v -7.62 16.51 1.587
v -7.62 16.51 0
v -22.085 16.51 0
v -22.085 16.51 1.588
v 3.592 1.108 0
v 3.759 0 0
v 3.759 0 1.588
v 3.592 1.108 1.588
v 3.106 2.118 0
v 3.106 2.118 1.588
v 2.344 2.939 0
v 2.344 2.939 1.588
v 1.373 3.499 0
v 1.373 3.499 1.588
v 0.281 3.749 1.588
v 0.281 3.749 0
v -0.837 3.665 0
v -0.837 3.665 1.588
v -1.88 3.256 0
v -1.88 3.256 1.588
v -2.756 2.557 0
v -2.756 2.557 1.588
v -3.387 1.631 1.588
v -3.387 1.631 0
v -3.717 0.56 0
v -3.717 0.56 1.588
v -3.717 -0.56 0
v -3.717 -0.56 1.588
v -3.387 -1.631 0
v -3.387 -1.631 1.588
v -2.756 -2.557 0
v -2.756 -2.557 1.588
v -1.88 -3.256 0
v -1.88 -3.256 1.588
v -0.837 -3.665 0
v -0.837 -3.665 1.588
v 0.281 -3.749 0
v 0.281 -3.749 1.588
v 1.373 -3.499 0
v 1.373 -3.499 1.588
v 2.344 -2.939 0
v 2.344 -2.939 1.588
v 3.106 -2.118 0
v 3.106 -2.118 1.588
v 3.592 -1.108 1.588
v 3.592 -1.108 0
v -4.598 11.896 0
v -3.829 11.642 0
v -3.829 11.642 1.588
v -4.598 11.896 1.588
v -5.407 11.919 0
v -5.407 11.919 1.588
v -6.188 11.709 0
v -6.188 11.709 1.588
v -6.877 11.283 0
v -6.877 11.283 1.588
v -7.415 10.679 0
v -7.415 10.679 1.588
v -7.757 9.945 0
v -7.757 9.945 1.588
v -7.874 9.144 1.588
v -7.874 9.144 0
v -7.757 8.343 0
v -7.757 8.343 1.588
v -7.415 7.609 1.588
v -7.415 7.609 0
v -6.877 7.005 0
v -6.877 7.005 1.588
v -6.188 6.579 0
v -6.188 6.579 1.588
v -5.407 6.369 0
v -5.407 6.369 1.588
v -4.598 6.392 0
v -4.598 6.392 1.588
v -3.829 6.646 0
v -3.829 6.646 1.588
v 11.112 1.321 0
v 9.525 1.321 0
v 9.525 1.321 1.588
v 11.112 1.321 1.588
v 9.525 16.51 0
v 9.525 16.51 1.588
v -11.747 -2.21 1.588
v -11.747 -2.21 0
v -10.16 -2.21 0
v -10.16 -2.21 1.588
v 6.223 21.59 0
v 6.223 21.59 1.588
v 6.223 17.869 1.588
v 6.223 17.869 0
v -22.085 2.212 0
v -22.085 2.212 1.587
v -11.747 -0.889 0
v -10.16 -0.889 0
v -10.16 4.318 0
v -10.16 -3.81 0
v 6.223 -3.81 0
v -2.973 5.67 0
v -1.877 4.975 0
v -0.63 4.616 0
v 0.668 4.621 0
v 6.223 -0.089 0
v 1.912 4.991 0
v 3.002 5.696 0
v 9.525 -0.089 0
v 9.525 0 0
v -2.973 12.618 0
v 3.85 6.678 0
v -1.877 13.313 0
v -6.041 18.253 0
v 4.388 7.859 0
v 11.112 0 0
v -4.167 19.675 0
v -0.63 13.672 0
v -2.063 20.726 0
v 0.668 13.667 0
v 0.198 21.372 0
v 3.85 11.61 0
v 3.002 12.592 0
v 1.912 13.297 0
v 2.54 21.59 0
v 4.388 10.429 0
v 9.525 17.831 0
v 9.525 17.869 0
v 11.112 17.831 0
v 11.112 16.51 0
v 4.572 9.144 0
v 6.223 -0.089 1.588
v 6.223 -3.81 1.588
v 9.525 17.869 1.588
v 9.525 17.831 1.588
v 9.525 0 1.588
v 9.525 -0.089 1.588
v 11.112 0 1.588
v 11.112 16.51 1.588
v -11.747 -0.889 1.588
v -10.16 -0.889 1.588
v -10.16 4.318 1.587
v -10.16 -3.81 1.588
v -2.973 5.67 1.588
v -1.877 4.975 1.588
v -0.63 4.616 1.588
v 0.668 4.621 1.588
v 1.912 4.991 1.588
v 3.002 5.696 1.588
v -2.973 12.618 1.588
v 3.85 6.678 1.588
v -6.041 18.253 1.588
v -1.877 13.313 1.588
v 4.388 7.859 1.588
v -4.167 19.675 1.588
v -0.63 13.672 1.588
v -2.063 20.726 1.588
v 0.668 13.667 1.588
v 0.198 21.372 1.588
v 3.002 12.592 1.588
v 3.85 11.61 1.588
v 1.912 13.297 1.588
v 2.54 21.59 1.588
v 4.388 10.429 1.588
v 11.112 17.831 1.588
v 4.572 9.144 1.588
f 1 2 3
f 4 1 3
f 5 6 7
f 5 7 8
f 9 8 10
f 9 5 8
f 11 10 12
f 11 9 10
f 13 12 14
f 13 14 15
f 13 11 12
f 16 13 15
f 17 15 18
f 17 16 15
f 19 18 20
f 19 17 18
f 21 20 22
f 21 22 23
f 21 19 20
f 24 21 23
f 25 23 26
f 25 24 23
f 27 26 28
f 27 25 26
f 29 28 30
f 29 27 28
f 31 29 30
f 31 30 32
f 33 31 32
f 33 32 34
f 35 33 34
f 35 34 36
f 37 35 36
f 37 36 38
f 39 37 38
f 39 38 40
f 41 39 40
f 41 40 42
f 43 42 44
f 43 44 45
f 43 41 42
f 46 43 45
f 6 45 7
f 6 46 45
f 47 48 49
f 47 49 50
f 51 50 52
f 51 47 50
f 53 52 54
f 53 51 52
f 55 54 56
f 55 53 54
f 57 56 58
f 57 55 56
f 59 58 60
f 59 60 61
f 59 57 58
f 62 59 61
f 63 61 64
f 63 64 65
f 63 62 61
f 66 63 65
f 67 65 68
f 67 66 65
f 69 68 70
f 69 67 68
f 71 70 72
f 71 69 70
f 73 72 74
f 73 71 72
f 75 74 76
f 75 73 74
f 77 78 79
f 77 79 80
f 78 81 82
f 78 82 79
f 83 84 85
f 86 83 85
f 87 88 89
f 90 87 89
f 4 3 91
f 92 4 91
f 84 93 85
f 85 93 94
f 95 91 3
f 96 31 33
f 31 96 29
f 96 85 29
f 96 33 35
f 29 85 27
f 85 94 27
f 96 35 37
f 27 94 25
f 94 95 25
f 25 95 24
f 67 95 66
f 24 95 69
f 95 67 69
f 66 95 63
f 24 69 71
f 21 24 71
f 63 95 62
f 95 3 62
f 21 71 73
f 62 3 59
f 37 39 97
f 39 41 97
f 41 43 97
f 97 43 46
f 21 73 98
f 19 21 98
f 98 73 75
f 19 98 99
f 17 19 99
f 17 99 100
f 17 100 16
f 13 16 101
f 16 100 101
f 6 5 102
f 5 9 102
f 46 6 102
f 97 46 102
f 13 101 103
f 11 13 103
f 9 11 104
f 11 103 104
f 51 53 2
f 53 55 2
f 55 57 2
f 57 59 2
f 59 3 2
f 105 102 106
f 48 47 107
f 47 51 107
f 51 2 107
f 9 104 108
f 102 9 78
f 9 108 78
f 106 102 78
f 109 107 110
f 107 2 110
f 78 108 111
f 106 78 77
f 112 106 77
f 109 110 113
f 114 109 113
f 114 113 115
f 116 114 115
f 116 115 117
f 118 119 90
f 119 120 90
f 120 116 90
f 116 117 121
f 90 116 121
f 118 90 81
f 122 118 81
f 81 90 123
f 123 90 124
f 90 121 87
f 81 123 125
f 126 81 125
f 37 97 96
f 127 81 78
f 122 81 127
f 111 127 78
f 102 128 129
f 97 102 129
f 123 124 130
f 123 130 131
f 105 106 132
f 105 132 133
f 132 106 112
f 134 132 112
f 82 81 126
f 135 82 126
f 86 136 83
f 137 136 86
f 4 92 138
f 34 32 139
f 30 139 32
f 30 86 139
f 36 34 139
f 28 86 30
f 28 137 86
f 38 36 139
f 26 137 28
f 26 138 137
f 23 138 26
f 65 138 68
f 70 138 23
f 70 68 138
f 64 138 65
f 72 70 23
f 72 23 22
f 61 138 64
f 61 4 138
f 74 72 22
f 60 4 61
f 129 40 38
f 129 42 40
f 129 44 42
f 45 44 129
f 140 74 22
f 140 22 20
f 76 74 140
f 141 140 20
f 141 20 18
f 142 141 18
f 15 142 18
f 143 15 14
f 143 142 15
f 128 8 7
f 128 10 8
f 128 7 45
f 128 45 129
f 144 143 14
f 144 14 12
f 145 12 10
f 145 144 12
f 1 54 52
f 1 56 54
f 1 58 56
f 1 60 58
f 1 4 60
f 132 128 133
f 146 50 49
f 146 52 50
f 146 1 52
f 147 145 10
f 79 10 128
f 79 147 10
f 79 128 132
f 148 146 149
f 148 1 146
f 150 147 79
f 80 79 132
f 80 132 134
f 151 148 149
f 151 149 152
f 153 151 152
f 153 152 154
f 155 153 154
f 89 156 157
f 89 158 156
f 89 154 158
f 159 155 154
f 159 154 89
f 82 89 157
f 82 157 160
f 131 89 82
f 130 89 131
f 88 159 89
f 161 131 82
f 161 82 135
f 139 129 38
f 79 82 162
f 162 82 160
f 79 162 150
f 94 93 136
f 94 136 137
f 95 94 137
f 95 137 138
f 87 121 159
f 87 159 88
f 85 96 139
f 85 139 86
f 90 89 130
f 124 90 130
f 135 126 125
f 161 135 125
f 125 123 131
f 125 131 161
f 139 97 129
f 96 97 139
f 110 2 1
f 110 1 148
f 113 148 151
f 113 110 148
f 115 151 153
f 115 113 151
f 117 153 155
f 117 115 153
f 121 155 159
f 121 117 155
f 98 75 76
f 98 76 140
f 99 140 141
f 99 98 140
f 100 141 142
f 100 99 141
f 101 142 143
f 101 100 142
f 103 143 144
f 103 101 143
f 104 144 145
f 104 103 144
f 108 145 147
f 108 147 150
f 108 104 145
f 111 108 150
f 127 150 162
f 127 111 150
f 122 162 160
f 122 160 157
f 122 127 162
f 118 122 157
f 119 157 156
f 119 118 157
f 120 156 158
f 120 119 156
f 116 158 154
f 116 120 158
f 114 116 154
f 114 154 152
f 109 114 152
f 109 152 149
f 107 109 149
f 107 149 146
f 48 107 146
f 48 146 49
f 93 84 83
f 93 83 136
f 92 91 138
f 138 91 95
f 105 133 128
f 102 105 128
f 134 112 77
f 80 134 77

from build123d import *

# Parameters (mm, degrees)
SKETCH1_R           = 3.7592
SKETCH1_W           = 1.5875
SKETCH1_H           = 1.3208
BOSS_EXTRUDE1_DEPTH = 1.5875
CUT_EXTRUDE1_REACH  = 32.926


with BuildPart() as part:
    # Sketch1 → Boss-Extrude1 (new body)
    # profile 1 of 6: a face of its own
    with BuildSketch(Plane.XY):
        with BuildLine():
            Line((2.54, 21.59), (9.525, 21.59))
            Line((9.525, 21.59), (9.525, -3.81))
            Line((9.525, -3.81), (-10.16, -3.81))
            Line((-10.16, -3.81), (-10.16, 8.89))
            ThreePointArc((-10.16, 8.89), (-6.440256121, 17.870256121), (2.54, 21.59))
        make_face()
        Circle(SKETCH1_R, mode=Mode.SUBTRACT)
        with BuildLine():
            ThreePointArc((-3.82905, 11.642311449), (-7.874, 9.144), (-3.82905, 6.645688551))
            ThreePointArc((-3.82905, 6.645688551), (4.572, 9.144), (-3.82905, 11.642311449))
        make_face(mode=Mode.SUBTRACT)
    # profile 2 of 6: a face of its own
    with BuildSketch(Plane.XY):
        with Locations((-10.95375, -1.5494)):
            Rectangle(SKETCH1_W, SKETCH1_H)
    # profile 3 of 6: a face of its own
    with BuildSketch(Plane.XY):
        with Locations((10.31875, 17.1704)):
            Rectangle(SKETCH1_W, SKETCH1_H)
    # profile 4 of 6: a face of its own
    with BuildSketch(Plane.XY):
        with Locations((10.31875, 0.6604)):
            Rectangle(SKETCH1_W, SKETCH1_H)
    # profile 5 of 6: a face of its own
    with BuildSketch(Plane.XY):
        with BuildLine():
            ThreePointArc((-10.16, 8.89), (-9.508277885, 12.906092628), (-7.62, 16.51))
            Line((-7.62, 16.51), (-22.084921519, 16.51))
            Line((-22.084921519, 16.51), (-22.084921519, 2.212007412))
            Line((-22.084921519, 2.212007412), (-10.16, 4.318))
            Line((-10.16, 4.318), (-10.16, 8.89))
        make_face()
    # profile 6 of 6: a face of its own
    with BuildSketch(Plane.XY):
        with BuildLine():
            ThreePointArc((-10.16, 8.89), (-9.508277885, 12.906092628), (-7.62, 16.51))
            Line((-7.62, 16.51), (-22.084921519, 16.51))
            Line((-22.084921519, 16.51), (-22.084921519, 2.212007412))
            Line((-22.084921519, 2.212007412), (-10.16, 4.318))
            Line((-10.16, 4.318), (-10.16, 8.89))
        make_face()
    extrude(amount=BOSS_EXTRUDE1_DEPTH)

    # Sketch2 → Cut-Extrude1 (cut, up to next)
    with BuildSketch(Plane.XY.offset(1.5875), mode=Mode.PRIVATE) as cut_extrude1_sk1:
        Polygon((6.223, -0.0889), (6.223, -3.81), (9.525, -3.81), (9.525, -3.0226), (9.525, -0.9144), (9.525, -0.0889), align=None)
    cut_extrude1_tool1 = extrude(cut_extrude1_sk1.sketch, amount=-CUT_EXTRUDE1_REACH, mode=Mode.PRIVATE) & part.part
    # Sketch2 → Cut-Extrude1 (cut, up to next)
    with BuildSketch(Plane.XY.offset(1.5875), mode=Mode.PRIVATE) as cut_extrude1_sk2:
        Polygon((9.525, 18.6944), (9.525, 20.8026), (9.525, 21.59), (6.223, 21.59), (6.223, 17.8689), (9.525, 17.8689), align=None)
    cut_extrude1_tool2 = extrude(cut_extrude1_sk2.sketch, amount=-CUT_EXTRUDE1_REACH, mode=Mode.PRIVATE) & part.part
    add(cut_extrude1_tool1.solids().sort_by_distance((7.874, -1.94945, 1.5875))[0], mode=Mode.SUBTRACT)
    add(cut_extrude1_tool2.solids().sort_by_distance((7.874, 19.72945, 1.5875))[0], mode=Mode.SUBTRACT)


solid = part.part
